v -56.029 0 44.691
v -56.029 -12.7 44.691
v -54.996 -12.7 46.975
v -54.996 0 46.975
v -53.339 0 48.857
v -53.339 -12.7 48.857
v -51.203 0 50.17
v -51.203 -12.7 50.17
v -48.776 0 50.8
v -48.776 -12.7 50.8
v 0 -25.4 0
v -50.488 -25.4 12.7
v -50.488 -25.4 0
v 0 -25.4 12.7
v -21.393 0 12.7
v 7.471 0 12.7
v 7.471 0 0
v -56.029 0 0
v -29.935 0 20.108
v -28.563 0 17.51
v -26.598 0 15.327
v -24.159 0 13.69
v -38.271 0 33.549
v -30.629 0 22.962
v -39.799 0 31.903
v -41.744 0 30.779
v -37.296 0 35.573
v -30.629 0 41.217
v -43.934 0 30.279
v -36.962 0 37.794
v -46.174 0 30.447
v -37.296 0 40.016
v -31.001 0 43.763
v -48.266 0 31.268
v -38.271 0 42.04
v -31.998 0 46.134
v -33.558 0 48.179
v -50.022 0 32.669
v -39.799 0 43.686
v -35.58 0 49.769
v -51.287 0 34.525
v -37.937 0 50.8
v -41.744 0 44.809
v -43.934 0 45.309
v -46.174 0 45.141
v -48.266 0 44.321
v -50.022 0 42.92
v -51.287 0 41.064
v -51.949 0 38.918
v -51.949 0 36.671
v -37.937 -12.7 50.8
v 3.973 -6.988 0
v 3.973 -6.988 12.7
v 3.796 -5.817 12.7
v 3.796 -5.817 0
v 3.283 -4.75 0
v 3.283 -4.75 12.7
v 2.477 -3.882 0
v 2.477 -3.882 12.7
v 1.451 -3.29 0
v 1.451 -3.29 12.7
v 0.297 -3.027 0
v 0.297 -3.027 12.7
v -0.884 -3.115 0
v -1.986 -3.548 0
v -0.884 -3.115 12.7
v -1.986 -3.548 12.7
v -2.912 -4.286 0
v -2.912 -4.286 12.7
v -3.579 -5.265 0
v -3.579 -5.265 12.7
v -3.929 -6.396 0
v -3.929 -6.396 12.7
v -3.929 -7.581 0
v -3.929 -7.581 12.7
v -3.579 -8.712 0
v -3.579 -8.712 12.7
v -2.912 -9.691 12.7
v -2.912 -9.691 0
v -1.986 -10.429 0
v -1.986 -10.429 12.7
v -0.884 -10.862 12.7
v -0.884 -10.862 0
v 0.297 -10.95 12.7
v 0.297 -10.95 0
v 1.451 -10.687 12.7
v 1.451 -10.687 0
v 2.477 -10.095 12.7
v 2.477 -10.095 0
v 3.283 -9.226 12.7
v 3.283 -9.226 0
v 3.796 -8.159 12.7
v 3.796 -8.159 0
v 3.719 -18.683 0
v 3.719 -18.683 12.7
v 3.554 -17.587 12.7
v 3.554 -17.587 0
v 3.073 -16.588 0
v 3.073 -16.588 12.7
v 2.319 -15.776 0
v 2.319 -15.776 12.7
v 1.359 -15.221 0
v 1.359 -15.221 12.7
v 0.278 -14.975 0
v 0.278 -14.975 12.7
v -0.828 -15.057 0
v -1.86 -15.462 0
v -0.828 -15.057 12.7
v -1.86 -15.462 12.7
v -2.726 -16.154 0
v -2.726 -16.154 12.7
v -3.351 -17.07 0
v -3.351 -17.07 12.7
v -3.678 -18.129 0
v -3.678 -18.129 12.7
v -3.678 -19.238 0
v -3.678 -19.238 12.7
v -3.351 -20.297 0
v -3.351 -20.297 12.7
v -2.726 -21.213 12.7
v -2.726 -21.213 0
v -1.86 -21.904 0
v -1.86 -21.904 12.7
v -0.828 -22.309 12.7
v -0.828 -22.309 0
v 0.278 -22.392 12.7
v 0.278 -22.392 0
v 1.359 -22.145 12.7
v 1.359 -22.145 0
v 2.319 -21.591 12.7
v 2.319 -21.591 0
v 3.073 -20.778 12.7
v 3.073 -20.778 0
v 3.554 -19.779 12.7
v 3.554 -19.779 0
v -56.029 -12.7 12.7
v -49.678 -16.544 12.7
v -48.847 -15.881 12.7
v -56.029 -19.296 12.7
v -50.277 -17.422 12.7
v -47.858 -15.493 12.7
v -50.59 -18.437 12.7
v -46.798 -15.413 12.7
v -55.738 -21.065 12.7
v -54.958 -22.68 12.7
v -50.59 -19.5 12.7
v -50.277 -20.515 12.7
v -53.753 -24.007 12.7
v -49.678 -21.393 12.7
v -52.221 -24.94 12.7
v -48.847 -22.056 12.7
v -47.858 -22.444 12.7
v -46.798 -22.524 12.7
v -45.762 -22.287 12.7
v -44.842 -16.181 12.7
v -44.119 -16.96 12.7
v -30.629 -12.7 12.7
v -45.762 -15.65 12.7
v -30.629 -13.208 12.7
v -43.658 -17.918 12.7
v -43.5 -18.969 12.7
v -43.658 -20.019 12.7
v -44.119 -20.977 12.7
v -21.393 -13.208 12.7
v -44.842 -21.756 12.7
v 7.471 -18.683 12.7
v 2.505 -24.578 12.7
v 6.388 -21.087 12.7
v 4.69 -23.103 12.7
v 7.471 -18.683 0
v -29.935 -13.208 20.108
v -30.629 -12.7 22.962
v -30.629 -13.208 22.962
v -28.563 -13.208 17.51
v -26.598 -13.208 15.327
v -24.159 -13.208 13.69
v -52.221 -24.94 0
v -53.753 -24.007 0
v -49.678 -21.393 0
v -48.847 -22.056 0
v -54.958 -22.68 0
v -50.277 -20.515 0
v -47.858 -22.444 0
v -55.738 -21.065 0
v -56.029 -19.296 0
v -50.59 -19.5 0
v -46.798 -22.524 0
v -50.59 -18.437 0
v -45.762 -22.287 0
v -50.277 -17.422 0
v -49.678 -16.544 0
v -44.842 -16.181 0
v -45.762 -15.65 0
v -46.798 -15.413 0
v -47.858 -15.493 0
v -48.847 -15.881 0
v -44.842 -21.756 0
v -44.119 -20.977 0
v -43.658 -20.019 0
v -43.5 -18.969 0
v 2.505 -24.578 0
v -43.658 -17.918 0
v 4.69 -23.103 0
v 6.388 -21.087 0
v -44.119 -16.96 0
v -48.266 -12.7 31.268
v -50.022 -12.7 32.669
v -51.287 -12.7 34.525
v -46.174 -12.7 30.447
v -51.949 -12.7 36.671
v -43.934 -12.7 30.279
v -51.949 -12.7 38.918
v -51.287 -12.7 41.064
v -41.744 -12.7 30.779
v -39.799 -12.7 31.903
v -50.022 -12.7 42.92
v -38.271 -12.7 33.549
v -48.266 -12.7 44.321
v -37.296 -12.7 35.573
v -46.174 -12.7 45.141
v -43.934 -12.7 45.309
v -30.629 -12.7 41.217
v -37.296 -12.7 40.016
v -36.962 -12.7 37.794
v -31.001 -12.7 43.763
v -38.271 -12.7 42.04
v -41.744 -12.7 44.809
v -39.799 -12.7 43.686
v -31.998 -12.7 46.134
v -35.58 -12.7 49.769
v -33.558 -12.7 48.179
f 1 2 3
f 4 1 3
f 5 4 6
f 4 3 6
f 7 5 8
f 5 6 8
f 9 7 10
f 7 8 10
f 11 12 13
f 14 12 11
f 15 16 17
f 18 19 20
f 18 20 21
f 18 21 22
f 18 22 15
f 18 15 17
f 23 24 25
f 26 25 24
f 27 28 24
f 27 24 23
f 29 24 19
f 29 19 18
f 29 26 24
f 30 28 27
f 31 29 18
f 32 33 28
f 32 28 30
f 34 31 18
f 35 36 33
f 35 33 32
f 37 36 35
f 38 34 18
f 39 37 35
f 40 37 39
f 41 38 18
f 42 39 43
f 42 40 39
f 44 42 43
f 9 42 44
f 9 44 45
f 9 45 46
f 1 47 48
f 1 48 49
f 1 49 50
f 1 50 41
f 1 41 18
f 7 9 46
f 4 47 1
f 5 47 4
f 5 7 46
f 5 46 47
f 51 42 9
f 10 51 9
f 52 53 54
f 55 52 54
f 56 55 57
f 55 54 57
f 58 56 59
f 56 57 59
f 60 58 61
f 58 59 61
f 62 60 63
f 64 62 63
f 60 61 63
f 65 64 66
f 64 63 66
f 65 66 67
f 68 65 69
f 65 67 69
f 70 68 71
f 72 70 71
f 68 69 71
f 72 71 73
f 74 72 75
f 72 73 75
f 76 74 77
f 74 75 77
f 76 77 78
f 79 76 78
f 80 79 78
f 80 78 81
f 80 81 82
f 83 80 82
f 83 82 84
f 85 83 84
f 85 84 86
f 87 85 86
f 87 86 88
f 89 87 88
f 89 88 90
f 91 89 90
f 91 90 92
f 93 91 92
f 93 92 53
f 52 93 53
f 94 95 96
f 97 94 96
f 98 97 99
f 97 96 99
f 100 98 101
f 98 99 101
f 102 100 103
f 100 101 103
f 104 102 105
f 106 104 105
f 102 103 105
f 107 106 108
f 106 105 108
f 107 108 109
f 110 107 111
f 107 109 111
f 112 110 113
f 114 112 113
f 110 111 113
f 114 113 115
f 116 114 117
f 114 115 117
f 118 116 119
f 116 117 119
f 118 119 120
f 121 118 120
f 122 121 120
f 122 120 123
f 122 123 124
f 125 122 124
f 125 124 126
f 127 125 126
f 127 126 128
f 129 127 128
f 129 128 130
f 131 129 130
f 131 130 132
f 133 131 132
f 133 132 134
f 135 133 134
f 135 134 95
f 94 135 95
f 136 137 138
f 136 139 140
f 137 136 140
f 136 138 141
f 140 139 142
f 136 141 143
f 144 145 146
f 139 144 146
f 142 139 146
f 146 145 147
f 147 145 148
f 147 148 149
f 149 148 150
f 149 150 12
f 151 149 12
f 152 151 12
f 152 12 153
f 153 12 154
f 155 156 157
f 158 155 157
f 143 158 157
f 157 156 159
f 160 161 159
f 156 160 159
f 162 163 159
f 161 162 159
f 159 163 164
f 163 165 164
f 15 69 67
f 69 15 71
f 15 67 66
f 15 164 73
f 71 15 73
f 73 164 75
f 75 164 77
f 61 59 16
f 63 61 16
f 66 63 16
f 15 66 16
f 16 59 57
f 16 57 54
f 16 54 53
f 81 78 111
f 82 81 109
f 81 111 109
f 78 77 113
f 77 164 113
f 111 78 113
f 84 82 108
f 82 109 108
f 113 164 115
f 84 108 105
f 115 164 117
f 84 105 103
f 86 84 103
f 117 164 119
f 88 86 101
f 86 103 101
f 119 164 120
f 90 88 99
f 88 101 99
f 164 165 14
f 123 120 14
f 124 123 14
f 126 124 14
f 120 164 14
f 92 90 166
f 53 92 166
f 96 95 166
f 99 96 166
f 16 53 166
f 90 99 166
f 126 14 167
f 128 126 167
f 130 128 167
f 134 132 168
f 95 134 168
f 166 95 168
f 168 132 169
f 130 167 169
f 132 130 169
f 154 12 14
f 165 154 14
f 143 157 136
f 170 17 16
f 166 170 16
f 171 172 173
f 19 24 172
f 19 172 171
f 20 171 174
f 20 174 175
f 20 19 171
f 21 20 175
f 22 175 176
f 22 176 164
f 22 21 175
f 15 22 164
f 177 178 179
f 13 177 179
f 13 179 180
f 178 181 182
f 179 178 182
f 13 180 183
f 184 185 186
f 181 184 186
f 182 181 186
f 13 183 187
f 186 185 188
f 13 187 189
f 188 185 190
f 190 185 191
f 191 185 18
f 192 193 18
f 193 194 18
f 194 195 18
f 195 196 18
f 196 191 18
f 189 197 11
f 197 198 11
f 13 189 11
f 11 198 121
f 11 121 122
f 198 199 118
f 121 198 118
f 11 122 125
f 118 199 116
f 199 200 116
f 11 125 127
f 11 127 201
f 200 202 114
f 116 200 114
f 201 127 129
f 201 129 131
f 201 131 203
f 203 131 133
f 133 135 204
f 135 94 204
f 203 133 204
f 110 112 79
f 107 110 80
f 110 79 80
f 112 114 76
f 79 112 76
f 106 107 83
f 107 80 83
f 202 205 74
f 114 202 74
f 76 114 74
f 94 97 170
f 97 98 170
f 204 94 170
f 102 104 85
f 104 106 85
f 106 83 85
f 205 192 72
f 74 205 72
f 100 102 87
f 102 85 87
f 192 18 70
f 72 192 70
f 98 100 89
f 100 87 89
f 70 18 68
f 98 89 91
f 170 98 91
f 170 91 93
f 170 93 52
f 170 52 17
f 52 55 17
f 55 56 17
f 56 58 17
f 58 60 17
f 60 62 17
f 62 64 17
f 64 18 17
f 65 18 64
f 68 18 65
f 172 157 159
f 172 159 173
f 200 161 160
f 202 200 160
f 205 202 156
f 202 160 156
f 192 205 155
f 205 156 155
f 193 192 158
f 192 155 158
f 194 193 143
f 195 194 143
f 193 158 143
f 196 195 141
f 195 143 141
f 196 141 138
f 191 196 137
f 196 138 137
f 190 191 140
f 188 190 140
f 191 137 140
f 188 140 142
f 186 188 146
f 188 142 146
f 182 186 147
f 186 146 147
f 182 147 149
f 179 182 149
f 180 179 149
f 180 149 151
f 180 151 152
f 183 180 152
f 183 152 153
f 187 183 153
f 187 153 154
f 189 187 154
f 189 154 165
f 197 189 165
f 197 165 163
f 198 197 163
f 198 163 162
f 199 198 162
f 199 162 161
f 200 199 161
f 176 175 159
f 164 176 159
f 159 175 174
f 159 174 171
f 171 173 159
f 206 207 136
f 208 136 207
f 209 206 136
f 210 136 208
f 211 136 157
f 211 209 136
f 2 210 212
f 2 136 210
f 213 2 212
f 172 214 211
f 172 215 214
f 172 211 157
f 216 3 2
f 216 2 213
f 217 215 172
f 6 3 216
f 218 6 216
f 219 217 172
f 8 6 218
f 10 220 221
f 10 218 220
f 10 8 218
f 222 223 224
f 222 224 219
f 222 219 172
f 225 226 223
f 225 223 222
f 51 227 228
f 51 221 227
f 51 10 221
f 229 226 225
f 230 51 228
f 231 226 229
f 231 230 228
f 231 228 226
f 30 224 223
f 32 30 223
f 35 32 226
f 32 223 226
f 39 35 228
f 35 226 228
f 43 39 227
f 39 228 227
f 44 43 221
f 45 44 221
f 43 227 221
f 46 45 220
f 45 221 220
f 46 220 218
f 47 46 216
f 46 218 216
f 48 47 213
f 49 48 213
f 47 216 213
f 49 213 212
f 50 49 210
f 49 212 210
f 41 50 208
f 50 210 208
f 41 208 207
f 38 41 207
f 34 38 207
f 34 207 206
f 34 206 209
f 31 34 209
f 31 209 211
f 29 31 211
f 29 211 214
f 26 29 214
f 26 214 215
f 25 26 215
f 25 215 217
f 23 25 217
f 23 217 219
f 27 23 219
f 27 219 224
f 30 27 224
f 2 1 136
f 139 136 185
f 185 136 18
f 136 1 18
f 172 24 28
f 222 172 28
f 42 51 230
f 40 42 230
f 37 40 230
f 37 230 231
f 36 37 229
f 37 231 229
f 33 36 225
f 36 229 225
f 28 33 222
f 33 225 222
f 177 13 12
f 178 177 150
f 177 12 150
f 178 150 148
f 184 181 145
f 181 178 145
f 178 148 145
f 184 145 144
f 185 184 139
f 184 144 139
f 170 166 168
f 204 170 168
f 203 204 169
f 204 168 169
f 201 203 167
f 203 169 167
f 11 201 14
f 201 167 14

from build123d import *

# Parameters (mm, degrees)
F1_DEPTH  = 25.4
F3_DEPTH  = 25.4
F5_DEPTH  = 12.7
F6_R      = 7.5359717886
F7_DEPTH  = 25.4
F9_DEPTH  = 25.4
F11_DEPTH = 13.208
F12_R     = 3.5651940515
F12_R_2   = 3.719082418
F13_DEPTH = 25.4
F14_R     = 3.972943494
F15_DEPTH = 25.4


# Not quite as in the source:
# - a feature names something its author has since deleted; it is built from what else it names


with BuildPart() as f1:
    # F0 (on Front) → F1 (new body)
    with BuildSketch(Plane.XZ):
        Polygon((-56.0294090864, 50.8), (-56.0294090864, 0), (7.4705909136, 0), (7.4705909136, 12.7), (-30.6294090864, 12.7), (-30.6294090864, 50.8), align=None)
    extrude(amount=F1_DEPTH)

    # F2 (on face) → F3 (cut)
    with BuildSketch(Plane.XZ.offset(25.4)):
        with BuildLine():
            ThreePointArc((-56.0294090864, 44.6911064088), (-53.33876103, 48.8568702153), (-48.7761497498, 50.8))
            Line((-48.7761497498, 50.8), (-56.0294090864, 50.8))
            Line((-56.0294090864, 50.8), (-56.0294090864, 44.6911064088))
        make_face()
        with BuildLine():
            Line((-30.6294090864, 50.8), (-37.9370041192, 50.8))
            ThreePointArc((-37.9370041192, 50.8), (-32.7129588614, 47.2060747706), (-30.6294090864, 41.2172712386))
            Line((-30.6294090864, 41.2172712386), (-30.6294090864, 50.8))
        make_face()
    extrude(amount=-F3_DEPTH, mode=Mode.SUBTRACT)

    # F4 (on face) → F5 (cut)
    with BuildSketch(Plane.XZ.offset(25.4)):
        with BuildLine():
            Line((-56.0294090864, 12.7), (-30.6294090864, 12.7))
            Line((-30.6294090864, 12.7), (-30.6294090864, 41.2172712386))
            ThreePointArc((-30.6294090864, 41.2172712386), (-32.7129588614, 47.2060747706), (-37.9370041192, 50.8))
            Line((-37.9370041192, 50.8), (-48.7761497498, 50.8))
            ThreePointArc((-48.7761497498, 50.8), (-53.33876103, 48.8568702153), (-56.0294090864, 44.6911064088))
            Line((-56.0294090864, 44.6911064088), (-56.0294090864, 12.7))
        make_face()
    extrude(amount=-F5_DEPTH, mode=Mode.SUBTRACT)

    # F6 (on face) → F7 (cut)
    with BuildSketch(Plane.XZ.offset(12.7)):
        with Locations((-44.4975420833, 37.7943851054)):
            Circle(F6_R)
    extrude(amount=-F7_DEPTH, mode=Mode.SUBTRACT)

    # F8 (on face) → F9 (cut)
    with BuildSketch(Plane.XY.offset(12.7)):
        with BuildLine():
            Line((-56.0294090864, -25.4), (-50.4875965416, -25.4))
            ThreePointArc((-50.4875965416, -25.4), (-54.4030732732, -23.3868988254), (-56.0294090864, -19.2956195392))
            Line((-56.0294090864, -19.2956195392), (-56.0294090864, -25.4))
        make_face()
        with BuildLine():
            ThreePointArc((7.4705909136, -18.6832621694), (4.6896834238, -23.1031347869), (0, -25.4))
            Line((0, -25.4), (7.4705909136, -25.4))
            Line((7.4705909136, -25.4), (7.4705909136, -18.6832621694))
        make_face()
    extrude(amount=-F9_DEPTH, mode=Mode.SUBTRACT)

    # F10 (on face) → F11 (join)
    with BuildSketch(Plane(origin=(0, 0, 0), x_dir=(-1, 0, 0), z_dir=(0, 1, 0))):
        with BuildLine():
            ThreePointArc((30.6294090864, 22.9618716985), (27.6481288956, 16.3576173964), (21.3930476457, 12.7))
            Line((21.3930476457, 12.7), (30.6294090864, 12.7))
            Line((30.6294090864, 12.7), (30.6294090864, 22.9618716985))
        make_face()
    extrude(amount=-F11_DEPTH)

    # F12 (on face) → F13 (cut)
    with BuildSketch(Plane.XY.offset(12.7)):
        with Locations((-47.0647066832, -18.9685039222)):
            Circle(F12_R)
        with Locations((0, -18.6832621694)):
            Circle(F12_R_2)
    extrude(amount=-F13_DEPTH, mode=Mode.SUBTRACT)

    # F14 (on face) → F15 (cut)
    with BuildSketch(Plane.XY.offset(12.7)):
        with Locations((0, -6.9883959368)):
            Circle(F14_R)
    extrude(amount=-F15_DEPTH, mode=Mode.SUBTRACT)


solid = f1.part
